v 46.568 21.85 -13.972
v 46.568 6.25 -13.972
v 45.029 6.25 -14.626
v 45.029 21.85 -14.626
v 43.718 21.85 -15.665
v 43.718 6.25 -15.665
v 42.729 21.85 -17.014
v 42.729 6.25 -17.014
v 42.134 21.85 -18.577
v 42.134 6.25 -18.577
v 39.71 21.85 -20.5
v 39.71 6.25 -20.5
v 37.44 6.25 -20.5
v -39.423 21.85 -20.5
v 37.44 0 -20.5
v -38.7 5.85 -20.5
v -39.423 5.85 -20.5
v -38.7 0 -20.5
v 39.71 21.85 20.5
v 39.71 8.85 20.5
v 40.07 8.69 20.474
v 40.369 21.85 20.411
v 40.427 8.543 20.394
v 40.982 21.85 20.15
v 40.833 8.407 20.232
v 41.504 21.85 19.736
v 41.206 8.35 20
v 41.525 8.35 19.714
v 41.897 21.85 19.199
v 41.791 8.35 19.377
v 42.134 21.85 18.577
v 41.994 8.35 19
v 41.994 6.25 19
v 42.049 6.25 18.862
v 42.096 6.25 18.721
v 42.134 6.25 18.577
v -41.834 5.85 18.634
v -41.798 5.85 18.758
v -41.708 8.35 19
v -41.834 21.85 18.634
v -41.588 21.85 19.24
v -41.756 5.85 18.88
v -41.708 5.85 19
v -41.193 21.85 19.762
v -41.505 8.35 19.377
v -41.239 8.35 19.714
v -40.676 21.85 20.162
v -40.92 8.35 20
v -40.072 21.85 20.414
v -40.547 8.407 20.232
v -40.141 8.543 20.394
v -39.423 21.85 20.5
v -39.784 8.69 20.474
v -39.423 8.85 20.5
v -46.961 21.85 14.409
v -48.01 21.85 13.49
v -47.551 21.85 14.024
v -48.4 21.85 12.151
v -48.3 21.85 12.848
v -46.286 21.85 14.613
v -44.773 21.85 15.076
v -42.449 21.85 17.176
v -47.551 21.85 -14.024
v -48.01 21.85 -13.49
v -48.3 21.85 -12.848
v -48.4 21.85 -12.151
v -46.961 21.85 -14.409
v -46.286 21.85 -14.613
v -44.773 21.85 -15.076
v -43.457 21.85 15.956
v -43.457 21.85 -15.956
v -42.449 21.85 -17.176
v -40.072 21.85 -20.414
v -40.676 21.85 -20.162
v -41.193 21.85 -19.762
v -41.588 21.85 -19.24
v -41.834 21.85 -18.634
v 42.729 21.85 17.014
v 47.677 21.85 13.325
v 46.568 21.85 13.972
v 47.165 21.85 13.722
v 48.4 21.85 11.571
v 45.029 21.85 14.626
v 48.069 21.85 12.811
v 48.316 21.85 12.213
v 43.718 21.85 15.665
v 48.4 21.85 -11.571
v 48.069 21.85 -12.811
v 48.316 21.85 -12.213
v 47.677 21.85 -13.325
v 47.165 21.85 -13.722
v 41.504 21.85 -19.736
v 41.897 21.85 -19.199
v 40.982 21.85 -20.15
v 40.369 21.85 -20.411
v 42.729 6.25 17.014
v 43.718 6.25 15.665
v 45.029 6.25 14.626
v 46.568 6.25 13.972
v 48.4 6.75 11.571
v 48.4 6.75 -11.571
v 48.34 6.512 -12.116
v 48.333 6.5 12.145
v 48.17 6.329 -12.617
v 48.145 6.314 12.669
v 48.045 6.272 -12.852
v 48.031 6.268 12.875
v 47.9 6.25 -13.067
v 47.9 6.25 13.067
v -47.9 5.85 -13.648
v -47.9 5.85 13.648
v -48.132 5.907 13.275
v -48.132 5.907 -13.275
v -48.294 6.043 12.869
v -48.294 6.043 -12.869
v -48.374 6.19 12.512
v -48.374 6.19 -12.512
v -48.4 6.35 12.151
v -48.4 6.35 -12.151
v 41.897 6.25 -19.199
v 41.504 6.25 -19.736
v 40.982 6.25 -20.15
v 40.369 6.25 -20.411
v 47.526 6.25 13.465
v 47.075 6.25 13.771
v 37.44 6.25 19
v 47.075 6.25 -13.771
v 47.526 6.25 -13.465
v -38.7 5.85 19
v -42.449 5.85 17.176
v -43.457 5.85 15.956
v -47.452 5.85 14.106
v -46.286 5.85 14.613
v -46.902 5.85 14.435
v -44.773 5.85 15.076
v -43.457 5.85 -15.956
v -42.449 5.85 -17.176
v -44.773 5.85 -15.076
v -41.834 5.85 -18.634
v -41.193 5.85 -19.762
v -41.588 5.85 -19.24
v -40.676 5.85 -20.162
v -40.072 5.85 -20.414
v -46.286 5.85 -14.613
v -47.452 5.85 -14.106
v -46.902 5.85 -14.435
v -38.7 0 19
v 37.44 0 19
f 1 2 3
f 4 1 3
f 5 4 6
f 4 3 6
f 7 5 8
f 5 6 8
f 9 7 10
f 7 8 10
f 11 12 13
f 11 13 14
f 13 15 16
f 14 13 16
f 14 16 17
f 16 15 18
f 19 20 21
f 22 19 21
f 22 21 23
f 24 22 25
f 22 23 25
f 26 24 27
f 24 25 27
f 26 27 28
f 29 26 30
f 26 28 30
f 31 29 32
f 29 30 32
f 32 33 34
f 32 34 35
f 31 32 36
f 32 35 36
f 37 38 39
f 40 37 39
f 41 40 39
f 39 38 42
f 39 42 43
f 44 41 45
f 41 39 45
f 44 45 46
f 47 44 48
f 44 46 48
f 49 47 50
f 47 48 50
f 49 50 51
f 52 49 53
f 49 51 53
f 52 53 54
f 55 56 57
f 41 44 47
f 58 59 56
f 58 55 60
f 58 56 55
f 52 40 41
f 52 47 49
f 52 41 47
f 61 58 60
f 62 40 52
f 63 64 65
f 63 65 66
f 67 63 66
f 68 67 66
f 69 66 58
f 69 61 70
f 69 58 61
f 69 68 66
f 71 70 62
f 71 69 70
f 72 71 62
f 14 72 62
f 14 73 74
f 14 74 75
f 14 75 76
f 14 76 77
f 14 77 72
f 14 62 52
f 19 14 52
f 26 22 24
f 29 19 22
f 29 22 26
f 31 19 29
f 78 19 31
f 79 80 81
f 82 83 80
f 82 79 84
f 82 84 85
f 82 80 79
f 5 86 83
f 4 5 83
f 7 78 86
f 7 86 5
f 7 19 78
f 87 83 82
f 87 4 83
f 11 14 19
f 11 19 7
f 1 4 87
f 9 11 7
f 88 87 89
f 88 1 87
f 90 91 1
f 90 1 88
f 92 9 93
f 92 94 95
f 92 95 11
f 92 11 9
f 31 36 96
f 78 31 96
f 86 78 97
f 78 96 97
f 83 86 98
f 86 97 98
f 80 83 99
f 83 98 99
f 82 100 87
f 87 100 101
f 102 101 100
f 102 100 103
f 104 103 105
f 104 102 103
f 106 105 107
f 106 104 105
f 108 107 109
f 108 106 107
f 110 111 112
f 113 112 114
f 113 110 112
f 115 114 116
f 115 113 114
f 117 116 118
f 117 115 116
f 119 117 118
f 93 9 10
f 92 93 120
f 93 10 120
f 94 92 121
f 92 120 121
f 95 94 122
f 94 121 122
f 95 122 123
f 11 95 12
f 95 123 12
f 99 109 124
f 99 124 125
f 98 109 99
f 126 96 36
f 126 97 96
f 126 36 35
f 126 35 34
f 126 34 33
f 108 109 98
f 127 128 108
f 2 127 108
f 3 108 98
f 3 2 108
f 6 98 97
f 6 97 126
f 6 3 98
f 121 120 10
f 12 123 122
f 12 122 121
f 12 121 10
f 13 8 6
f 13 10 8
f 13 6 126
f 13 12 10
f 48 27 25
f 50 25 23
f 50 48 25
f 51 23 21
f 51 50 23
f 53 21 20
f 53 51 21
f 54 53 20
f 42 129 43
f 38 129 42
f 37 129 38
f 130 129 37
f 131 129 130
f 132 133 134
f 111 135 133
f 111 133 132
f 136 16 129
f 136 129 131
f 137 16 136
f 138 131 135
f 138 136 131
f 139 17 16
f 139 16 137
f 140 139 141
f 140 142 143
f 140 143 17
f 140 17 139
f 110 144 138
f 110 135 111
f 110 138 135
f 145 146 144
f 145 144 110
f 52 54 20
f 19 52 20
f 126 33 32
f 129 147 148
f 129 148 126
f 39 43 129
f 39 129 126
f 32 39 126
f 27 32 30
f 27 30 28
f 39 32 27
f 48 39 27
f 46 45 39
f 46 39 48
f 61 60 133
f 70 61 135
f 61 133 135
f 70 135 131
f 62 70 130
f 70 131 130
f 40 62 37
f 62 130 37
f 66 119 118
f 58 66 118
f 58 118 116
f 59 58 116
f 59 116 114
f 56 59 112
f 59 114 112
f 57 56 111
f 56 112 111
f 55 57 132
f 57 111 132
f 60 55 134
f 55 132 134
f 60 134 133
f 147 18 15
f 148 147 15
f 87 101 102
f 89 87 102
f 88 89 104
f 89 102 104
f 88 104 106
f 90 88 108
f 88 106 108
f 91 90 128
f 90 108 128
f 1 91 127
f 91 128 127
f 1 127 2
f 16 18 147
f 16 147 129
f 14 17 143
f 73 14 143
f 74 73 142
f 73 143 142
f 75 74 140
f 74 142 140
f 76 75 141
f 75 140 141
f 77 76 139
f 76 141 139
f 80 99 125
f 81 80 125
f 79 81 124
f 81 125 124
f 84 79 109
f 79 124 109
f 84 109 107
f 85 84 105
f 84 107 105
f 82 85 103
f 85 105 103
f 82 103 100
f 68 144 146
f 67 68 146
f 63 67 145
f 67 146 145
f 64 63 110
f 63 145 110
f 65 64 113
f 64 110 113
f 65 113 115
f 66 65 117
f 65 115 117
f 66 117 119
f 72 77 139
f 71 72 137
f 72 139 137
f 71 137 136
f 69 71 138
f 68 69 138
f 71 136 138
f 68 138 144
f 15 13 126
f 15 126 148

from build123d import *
from OCP.BRepAlgoAPI import BRepAlgoAPI_Cut
from OCP.TopTools import TopTools_ListOfShape

# Parameters (mm, degrees)
BOSS_EXTRUDE1_DEPTH     = 21.85
CUT_EXTRUDE1_DEPTH      = 48.4
CUT_EXTRUDE1_DEPTH_BACK = 48.4
CUT_EXTRUDE2_DEPTH      = 20.5
CUT_EXTRUDE2_DEPTH_BACK = 20.5


with BuildPart() as part:
    # Sketch1 → Boss-Extrude1 (new body)
    with BuildSketch(Plane(origin=(0, 0, 0), x_dir=(1, 0, 0), z_dir=(0, 1, 0))):
        with BuildLine():
            Line((-48.4, 12.151203914), (-48.4, -12.151203914))
            ThreePointArc((-48.4, -12.151203914), (-47.79906628, -13.773402604), (-46.286322418, -14.612602183))
            ThreePointArc((-46.286322418, -14.612602183), (-43.456956945, -15.955525197), (-41.833947517, -18.63406801))
            ThreePointArc((-41.833947517, -18.63406801), (-40.94758788, -19.979013629), (-39.423420787, -20.5))
            Line((-39.423420787, -20.5), (39.709565228, -20.5))
            ThreePointArc((39.709565228, -20.5), (41.256886583, -19.960870735), (42.134162778, -18.57694508))
            ThreePointArc((42.134162778, -18.57694508), (43.717900388, -15.664841516), (46.568112128, -13.972250299))
            ThreePointArc((46.568112128, -13.972250299), (47.889747358, -13.080993613), (48.4, -11.570794818))
            Line((48.4, -11.570794818), (48.4, 11.570794818))
            ThreePointArc((48.4, 11.570794818), (47.889747358, 13.080993613), (46.568112128, 13.972250299))
            ThreePointArc((46.568112128, 13.972250299), (43.717900388, 15.664841516), (42.134162778, 18.57694508))
            ThreePointArc((42.134162778, 18.57694508), (41.256886583, 19.960870735), (39.709565228, 20.5))
            Line((39.709565228, 20.5), (-39.423420787, 20.5))
            ThreePointArc((-39.423420787, 20.5), (-40.94758788, 19.979013629), (-41.833947517, 18.63406801))
            ThreePointArc((-41.833947517, 18.63406801), (-43.456956895, 15.955525241), (-46.286322286, 14.612602203))
            ThreePointArc((-46.286322286, 14.612602203), (-47.799066237, 13.773402654), (-48.4, 12.151203914))
        make_face()
    extrude(amount=BOSS_EXTRUDE1_DEPTH)

    # Sketch2 → Cut-Extrude1 (cut, two sides: drawn at the far end of the back side and taken through both)
    with BuildSketch(Plane(origin=(0, 0, 0), x_dir=(0, 0, -1), z_dir=(1, 0, 0)).offset(-CUT_EXTRUDE1_DEPTH_BACK)):
        with BuildLine():
            Line((-20.5, 8.85), (-20.5, 0))
            Line((-20.5, 0), (-19, 0))
            Line((-19, 0), (-19, 8.35))
            Line((-19, 8.35), (-20, 8.35))
            ThreePointArc((-20, 8.35), (-20.353553391, 8.496446609), (-20.5, 8.85))
        make_face()
    extrude(amount=CUT_EXTRUDE1_DEPTH + CUT_EXTRUDE1_DEPTH_BACK, mode=Mode.SUBTRACT)


with BuildPart() as cut_extrude2_tool:
    # Sketch3 → Cut-Extrude2 (new, two sides: drawn at the far end of the back side and taken through both)
    with BuildSketch(Plane.XY.offset(-CUT_EXTRUDE2_DEPTH_BACK)):
        with BuildLine():
            Line((-48.4, -5), (48.4, -5))
            Line((48.4, -5), (48.4, 6.75))
            ThreePointArc((48.4, 6.75), (48.253553391, 6.396446609), (47.9, 6.25))
            Line((47.9, 6.25), (37.44, 6.25))
            Line((37.44, 6.25), (37.44, 0))
            Line((37.44, 0), (-38.7, 0))
            Line((-38.7, 0), (-38.7, 5.85))
            Line((-38.7, 5.85), (-47.9, 5.85))
            ThreePointArc((-47.9, 5.85), (-48.253553391, 5.996446609), (-48.4, 6.35))
            Line((-48.4, 6.35), (-48.4, -5))
        make_face()
    extrude(amount=CUT_EXTRUDE2_DEPTH + CUT_EXTRUDE2_DEPTH_BACK)


with BuildPart() as part_1:
    add(part.part)

    # Cut-Extrude2: cut by cut_extrude2_tool, with a tolerance
    cut_extrude2_stock = TopTools_ListOfShape()
    cut_extrude2_stock.Append(part_1.part.wrapped)
    cut_extrude2_tools = TopTools_ListOfShape()
    cut_extrude2_tools.Append(cut_extrude2_tool.part.wrapped)
    cut_extrude2_cut = BRepAlgoAPI_Cut()
    cut_extrude2_cut.SetArguments(cut_extrude2_stock)
    cut_extrude2_cut.SetTools(cut_extrude2_tools)
    cut_extrude2_cut.SetFuzzyValue(0.00001)
    cut_extrude2_cut.Build()
    add(Compound.cast(cut_extrude2_cut.Shape()).solids(), mode=Mode.REPLACE)


solid = part_1.part
